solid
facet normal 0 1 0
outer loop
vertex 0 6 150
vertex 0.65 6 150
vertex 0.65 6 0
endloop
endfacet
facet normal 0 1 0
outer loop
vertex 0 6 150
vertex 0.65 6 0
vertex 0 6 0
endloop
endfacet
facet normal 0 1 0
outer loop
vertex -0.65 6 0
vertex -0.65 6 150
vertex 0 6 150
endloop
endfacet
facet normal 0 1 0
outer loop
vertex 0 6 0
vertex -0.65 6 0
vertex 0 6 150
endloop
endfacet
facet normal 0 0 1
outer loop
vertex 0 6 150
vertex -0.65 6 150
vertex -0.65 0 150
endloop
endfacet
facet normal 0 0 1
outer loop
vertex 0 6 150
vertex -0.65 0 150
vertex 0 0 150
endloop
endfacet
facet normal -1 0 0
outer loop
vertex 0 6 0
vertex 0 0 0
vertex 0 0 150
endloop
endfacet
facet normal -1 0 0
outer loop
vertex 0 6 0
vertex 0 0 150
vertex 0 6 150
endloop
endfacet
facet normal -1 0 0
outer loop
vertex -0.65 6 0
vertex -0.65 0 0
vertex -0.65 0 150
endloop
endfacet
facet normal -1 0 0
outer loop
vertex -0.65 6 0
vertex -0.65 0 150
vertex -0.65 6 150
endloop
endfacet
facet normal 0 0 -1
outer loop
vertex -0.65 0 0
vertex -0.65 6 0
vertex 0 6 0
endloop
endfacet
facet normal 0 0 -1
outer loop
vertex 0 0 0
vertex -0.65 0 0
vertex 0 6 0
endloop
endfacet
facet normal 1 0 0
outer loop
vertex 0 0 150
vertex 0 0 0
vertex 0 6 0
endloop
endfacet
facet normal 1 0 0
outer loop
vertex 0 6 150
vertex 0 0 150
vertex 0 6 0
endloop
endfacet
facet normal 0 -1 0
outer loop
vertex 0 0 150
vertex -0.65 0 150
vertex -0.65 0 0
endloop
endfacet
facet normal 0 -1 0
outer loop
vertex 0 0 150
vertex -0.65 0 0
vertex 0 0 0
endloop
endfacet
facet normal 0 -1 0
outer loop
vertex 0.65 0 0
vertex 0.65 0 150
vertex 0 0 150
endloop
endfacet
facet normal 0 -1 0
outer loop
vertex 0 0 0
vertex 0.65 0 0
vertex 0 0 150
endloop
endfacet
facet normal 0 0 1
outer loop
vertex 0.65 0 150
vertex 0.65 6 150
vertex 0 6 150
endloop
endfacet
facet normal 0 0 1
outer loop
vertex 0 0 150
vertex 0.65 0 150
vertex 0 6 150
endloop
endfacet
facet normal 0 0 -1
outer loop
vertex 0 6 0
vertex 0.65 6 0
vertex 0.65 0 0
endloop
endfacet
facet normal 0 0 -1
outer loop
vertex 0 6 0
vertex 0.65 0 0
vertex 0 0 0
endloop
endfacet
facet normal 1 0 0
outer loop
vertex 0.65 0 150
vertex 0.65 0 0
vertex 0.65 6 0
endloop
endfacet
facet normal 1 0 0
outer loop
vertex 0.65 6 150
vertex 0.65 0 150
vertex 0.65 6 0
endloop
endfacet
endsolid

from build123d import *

# Parameters (mm, degrees)
SKETCH1_W           = 0.65
SKETCH1_H           = 6
BOSS_EXTRUDE1_DEPTH = 150


with BuildPart() as part:
    # Sketch1 → Boss-Extrude1 (new body)
    with BuildSketch(Plane.XY):
        with Locations((-0.325, 3)):
            Rectangle(SKETCH1_W, SKETCH1_H)
    extrude(amount=BOSS_EXTRUDE1_DEPTH)


with BuildPart() as body_2:
    # Mirror2: mirrored copy
    add(part.part.mirror(Plane(origin=(0, 0, 150), x_dir=(0, 0, 1), z_dir=(-1, 0, 0))))


solid = Compound([part.part, body_2.part])
